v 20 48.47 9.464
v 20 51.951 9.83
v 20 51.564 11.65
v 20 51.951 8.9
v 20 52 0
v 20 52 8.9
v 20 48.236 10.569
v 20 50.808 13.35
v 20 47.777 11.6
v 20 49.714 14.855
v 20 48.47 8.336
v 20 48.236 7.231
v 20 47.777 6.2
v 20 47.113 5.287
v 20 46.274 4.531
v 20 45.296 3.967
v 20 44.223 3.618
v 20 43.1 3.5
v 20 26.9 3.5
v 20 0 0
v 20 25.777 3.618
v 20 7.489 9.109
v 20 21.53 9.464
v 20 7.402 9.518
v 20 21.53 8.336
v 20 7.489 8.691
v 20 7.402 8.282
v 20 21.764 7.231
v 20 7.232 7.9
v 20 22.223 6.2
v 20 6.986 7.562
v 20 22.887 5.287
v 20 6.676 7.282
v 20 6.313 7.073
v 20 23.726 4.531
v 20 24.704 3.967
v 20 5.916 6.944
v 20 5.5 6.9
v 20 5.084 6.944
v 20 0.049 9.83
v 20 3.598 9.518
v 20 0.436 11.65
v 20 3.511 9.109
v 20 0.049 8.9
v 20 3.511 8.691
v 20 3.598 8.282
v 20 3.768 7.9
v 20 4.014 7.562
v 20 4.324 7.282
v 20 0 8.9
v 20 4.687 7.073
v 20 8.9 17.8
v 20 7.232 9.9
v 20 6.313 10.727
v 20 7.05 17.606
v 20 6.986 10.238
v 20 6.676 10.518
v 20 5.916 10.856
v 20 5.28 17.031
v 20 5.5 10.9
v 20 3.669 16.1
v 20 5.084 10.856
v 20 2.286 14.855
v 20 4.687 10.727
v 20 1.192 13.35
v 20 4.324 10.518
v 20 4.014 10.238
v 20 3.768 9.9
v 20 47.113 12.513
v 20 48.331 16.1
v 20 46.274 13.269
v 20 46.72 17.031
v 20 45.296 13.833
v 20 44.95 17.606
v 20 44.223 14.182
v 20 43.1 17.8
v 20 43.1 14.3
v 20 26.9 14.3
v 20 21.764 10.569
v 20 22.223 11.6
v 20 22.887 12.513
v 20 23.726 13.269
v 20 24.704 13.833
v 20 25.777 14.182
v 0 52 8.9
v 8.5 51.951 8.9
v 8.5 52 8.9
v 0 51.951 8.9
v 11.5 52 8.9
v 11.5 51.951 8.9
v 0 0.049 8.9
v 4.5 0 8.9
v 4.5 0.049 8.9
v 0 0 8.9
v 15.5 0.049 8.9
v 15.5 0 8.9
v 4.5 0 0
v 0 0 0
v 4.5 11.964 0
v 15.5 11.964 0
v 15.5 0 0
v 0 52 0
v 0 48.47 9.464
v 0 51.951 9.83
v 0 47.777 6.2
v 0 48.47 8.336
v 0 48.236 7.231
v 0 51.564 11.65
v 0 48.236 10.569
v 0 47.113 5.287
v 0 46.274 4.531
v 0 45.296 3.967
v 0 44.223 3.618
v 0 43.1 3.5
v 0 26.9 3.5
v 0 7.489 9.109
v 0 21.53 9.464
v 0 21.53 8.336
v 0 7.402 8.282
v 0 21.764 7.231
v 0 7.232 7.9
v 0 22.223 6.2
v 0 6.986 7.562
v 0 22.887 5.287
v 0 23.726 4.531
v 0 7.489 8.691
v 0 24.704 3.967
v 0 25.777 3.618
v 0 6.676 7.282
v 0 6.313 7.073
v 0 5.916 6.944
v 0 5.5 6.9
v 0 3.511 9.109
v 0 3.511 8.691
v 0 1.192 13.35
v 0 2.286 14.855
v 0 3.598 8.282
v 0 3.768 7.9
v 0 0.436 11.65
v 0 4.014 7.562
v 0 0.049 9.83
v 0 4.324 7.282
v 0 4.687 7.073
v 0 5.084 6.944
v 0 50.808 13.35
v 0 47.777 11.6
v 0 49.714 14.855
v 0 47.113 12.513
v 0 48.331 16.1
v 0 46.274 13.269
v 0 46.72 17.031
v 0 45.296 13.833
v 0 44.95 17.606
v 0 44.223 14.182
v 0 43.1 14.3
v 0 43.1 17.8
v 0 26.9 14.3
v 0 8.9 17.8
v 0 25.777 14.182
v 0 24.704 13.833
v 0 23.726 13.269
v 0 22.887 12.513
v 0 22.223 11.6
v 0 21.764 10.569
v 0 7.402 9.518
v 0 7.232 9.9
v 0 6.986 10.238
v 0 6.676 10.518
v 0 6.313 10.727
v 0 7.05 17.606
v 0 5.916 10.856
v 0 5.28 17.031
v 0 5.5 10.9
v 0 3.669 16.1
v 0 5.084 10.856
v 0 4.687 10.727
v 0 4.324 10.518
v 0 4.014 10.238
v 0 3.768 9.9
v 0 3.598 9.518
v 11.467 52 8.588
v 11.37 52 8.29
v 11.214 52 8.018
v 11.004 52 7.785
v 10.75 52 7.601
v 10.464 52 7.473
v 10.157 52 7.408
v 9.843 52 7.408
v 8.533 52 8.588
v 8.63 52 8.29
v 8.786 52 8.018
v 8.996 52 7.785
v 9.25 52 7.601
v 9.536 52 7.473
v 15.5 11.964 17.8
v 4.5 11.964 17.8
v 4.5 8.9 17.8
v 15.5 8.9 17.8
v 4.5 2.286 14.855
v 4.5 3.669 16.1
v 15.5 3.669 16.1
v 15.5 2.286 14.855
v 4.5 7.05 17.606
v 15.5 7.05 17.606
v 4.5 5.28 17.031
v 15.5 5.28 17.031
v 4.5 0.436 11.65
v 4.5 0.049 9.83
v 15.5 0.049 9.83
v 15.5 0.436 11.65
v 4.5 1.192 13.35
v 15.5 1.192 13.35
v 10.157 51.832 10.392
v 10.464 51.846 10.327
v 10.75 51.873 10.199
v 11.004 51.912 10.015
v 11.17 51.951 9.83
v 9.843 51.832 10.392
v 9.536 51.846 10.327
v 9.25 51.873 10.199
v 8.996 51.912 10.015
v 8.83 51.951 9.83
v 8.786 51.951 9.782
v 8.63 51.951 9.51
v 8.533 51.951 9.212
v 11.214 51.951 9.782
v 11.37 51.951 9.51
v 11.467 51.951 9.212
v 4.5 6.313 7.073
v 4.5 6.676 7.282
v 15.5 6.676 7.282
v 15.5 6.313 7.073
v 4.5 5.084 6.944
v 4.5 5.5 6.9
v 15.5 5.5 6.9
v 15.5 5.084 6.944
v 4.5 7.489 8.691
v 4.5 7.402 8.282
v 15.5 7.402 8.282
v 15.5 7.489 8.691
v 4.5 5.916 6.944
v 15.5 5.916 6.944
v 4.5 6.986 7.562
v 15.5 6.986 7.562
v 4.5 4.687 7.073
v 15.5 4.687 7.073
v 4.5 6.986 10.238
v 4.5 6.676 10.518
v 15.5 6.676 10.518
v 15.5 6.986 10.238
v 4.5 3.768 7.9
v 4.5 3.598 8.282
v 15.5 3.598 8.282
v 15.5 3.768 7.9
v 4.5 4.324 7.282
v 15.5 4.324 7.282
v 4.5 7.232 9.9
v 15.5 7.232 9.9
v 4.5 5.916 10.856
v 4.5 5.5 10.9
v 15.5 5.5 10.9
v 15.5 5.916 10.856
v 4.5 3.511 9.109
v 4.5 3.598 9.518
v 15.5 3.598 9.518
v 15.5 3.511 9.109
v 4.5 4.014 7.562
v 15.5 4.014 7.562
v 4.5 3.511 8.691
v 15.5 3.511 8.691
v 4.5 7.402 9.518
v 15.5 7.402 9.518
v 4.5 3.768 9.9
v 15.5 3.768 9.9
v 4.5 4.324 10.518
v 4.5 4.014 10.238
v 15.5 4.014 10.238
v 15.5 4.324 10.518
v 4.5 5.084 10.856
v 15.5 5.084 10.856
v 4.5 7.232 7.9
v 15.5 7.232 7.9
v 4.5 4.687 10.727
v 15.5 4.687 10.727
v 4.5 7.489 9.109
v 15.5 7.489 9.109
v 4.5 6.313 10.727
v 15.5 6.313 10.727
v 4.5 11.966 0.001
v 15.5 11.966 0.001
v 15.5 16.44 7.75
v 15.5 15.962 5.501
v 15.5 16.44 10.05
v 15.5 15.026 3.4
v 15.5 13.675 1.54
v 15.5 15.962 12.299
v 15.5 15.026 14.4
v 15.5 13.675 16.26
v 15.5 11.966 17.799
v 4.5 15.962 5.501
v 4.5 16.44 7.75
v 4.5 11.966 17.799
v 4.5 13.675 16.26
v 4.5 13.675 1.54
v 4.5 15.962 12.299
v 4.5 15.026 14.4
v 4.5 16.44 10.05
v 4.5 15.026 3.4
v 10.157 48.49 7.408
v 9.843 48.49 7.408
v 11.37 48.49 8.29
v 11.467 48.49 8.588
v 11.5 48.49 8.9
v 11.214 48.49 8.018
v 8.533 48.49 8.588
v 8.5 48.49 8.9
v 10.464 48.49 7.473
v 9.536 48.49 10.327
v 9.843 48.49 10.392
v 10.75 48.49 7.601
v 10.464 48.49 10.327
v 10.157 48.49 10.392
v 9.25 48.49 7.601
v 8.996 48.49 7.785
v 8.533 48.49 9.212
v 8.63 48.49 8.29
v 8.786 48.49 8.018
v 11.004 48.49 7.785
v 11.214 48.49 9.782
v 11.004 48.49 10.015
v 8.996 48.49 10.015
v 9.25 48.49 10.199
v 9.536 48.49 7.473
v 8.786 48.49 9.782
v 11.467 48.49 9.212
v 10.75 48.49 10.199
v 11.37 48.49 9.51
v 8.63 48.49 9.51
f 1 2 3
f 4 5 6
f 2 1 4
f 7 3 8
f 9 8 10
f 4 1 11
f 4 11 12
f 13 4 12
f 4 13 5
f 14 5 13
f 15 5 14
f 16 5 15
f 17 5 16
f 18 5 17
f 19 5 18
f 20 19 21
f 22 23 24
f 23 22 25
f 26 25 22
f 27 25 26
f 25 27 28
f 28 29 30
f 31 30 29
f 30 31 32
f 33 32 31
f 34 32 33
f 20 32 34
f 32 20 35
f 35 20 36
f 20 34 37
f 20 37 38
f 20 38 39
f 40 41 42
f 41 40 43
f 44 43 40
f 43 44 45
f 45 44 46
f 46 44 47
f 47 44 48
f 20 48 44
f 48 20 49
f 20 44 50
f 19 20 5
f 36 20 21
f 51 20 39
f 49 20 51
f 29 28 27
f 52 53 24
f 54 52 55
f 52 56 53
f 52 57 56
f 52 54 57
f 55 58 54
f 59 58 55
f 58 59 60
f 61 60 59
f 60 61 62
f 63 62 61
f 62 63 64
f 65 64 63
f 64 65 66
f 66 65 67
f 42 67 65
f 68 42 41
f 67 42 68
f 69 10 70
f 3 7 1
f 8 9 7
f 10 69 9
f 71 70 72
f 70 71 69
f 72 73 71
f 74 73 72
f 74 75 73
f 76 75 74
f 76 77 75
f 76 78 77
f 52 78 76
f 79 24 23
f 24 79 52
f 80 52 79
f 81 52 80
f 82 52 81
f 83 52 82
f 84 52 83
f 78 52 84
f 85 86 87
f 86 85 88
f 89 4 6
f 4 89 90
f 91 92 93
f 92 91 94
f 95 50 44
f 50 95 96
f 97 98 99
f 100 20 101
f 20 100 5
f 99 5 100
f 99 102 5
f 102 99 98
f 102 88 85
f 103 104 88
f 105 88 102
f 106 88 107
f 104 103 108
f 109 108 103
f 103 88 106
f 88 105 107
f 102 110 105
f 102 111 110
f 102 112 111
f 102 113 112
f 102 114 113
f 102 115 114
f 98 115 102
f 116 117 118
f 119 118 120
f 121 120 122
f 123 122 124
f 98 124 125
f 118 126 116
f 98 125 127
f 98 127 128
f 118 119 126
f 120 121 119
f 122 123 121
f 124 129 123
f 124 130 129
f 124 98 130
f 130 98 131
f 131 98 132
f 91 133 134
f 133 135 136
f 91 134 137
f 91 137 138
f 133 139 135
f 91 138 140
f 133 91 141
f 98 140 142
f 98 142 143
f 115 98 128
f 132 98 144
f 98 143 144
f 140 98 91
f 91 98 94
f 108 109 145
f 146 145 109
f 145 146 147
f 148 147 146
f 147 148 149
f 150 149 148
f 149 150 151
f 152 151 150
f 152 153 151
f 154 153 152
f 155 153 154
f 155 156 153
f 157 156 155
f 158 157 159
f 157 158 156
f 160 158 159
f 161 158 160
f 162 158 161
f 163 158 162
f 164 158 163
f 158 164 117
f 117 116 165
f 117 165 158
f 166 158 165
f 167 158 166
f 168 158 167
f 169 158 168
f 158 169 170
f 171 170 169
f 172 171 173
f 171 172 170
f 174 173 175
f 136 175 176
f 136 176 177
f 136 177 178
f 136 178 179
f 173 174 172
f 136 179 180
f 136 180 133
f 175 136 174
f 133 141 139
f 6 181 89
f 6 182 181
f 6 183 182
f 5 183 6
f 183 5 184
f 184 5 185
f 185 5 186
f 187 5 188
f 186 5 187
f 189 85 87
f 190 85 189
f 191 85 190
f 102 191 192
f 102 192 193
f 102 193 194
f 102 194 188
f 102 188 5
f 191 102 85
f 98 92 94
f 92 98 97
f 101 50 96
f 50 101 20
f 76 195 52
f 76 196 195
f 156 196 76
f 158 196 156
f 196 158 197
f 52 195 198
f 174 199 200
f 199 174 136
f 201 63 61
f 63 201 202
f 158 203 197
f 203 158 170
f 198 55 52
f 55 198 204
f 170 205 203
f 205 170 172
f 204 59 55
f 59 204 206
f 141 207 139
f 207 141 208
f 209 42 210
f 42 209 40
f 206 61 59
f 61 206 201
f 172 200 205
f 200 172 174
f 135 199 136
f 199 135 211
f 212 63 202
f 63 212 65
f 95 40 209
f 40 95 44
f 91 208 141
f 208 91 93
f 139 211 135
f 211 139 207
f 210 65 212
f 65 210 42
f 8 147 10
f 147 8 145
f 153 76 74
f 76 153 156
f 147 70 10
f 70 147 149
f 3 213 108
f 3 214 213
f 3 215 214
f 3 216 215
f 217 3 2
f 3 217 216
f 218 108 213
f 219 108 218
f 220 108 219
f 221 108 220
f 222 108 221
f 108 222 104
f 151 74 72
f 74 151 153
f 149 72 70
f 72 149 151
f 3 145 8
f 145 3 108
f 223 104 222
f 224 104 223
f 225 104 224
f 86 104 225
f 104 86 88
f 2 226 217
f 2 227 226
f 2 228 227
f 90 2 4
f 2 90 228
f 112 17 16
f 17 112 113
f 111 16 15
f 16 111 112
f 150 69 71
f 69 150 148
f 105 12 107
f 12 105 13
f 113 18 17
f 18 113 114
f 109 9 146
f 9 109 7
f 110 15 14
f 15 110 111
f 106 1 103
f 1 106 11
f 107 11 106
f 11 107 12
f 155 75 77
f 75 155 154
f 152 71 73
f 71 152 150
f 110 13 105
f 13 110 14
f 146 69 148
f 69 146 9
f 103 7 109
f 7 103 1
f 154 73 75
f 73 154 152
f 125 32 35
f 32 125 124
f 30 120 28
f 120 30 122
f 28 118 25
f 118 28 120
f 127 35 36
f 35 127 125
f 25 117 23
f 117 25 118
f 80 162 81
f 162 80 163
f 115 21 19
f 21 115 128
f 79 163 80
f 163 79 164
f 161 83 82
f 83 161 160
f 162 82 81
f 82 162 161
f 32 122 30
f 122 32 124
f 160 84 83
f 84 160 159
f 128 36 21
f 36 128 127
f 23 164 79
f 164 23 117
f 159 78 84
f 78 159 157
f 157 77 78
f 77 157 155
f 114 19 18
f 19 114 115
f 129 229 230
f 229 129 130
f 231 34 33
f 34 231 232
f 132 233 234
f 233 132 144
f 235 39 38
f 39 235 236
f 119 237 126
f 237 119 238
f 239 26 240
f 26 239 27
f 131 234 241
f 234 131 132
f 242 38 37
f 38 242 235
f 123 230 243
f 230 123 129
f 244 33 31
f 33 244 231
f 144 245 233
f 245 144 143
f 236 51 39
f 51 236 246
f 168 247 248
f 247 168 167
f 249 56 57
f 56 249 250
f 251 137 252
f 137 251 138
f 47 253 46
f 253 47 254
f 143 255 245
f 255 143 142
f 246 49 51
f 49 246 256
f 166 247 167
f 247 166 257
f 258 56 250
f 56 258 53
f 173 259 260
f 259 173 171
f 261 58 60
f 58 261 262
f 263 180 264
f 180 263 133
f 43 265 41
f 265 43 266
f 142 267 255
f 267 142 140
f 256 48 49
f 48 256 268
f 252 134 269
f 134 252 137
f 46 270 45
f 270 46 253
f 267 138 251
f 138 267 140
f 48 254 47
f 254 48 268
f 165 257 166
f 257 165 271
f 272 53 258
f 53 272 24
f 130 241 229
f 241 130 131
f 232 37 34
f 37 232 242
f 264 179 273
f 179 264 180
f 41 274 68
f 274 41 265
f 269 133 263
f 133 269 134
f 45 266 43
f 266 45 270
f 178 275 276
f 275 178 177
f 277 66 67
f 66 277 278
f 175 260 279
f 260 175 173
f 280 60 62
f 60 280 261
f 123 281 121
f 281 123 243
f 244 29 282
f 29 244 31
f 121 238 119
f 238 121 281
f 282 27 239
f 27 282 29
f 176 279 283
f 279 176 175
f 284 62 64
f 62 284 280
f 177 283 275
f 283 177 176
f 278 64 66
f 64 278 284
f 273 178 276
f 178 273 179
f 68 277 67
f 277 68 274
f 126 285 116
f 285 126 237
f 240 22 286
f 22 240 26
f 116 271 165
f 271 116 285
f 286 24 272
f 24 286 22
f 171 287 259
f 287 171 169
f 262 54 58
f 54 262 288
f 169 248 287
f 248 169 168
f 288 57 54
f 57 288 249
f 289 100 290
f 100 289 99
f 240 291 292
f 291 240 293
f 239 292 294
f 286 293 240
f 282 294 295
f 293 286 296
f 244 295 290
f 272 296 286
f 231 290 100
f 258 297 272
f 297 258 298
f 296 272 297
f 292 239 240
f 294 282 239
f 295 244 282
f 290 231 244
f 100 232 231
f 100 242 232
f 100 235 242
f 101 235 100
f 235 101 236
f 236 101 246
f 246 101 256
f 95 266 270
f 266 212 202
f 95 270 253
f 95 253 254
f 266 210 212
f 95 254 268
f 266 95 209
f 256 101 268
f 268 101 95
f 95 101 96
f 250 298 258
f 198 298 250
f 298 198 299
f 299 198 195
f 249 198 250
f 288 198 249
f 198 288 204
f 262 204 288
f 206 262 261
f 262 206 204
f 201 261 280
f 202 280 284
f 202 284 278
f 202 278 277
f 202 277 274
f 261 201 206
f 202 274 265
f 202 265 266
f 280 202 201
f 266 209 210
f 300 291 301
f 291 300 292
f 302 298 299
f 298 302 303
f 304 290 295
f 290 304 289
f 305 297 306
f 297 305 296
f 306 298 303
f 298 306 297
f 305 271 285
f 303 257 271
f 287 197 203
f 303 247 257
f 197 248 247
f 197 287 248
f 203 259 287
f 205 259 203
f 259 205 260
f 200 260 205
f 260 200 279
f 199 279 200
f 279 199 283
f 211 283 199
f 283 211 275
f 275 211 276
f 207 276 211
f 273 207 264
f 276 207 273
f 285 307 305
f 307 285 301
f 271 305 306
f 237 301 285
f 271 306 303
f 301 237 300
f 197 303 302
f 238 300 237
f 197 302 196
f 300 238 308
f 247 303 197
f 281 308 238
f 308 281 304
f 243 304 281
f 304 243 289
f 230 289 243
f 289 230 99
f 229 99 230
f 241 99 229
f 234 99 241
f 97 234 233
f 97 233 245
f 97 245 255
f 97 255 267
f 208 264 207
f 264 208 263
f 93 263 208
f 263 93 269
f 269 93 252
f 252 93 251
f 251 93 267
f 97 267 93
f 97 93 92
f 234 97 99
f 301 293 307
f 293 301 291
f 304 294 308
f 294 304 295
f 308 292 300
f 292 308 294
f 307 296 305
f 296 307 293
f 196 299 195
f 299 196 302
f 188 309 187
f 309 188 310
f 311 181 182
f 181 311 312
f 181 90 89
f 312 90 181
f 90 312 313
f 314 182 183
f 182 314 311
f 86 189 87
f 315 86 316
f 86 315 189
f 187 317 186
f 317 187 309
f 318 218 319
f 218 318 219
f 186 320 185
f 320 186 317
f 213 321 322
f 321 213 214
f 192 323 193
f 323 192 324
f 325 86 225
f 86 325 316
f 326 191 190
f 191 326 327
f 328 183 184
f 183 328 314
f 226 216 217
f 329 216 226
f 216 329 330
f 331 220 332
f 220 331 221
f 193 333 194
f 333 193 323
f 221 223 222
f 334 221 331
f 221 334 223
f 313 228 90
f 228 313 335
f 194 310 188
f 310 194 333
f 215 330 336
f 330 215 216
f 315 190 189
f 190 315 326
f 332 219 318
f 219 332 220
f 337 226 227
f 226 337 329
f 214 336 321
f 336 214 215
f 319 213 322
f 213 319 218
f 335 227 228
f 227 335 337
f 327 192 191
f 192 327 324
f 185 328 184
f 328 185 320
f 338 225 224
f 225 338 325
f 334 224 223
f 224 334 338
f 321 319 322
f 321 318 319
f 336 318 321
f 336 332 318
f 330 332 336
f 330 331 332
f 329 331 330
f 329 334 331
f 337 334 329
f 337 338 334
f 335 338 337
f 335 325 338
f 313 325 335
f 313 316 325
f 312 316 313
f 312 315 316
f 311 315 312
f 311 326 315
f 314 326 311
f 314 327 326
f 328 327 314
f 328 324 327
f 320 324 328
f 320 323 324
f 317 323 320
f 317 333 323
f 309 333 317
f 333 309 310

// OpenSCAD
$fn=30;

eps = 0.01;

r_screw_hole = 1.5;
r_bearing_screw_hole = 2.0;
wall_thickness = 3.5;
wall_thickness2 = 4.5;

r_hole = 5.4;
r_bearing_hole = 11;

width = 20;
length_slot = 5 * r_hole;
height = 2 * (r_hole + wall_thickness);
length = wall_thickness + r_bearing_hole + 2*wall_thickness + length_slot + wall_thickness;


module y_idler_base(){
	cube([width,length,height/2]);
	translate([0,height/2,height/2]) cube([width,length-height,height/2]);
	translate([0,height/2,height/2]) rotate([0,90,0]) cylinder(h=width,r=height/2);
	translate([0,length-height/2,height/2]) rotate([0,90,0]) cylinder(h=width,r=height/2);
}


module draw_slot() {
	translate([-eps,length-height/2,height/2]) rotate([0,90,0]) cylinder(h=width+2*eps,r=r_hole);
	translate([-eps,length-height/2-length_slot+2*r_hole,height/2]) rotate([0,90,0]) cylinder(h=width+2*eps,r=r_hole);
	translate([-eps,length-length_slot-height/2+2*r_hole,height/2-r_hole]) cube([width+2*eps,length_slot-2*r_hole,2*r_hole]);
}


module y_idler_holes(){
	draw_slot();
	// bearing hole
	translate([-eps,wall_thickness+r_bearing_screw_hole,height/2]) rotate([0,90,0]) cylinder(h=width+2*eps,r=r_bearing_screw_hole);
	translate([wall_thickness2,wall_thickness+r_bearing_screw_hole,height/2]) rotate([0,90,0]) cylinder(h=width-2*wall_thickness2,r=r_bearing_hole);
	// screw hole
	translate([width/2,length-wall_thickness-eps,height/2]) rotate([-90,0,0]) cylinder(h=wall_thickness+2*eps,r=r_screw_hole);
}


module y_idler(){
	translate(v = [0,0,0]) rotate([0,0,0]) difference(){
  		y_idler_base();
  		y_idler_holes();
 	}
}


y_idler();
